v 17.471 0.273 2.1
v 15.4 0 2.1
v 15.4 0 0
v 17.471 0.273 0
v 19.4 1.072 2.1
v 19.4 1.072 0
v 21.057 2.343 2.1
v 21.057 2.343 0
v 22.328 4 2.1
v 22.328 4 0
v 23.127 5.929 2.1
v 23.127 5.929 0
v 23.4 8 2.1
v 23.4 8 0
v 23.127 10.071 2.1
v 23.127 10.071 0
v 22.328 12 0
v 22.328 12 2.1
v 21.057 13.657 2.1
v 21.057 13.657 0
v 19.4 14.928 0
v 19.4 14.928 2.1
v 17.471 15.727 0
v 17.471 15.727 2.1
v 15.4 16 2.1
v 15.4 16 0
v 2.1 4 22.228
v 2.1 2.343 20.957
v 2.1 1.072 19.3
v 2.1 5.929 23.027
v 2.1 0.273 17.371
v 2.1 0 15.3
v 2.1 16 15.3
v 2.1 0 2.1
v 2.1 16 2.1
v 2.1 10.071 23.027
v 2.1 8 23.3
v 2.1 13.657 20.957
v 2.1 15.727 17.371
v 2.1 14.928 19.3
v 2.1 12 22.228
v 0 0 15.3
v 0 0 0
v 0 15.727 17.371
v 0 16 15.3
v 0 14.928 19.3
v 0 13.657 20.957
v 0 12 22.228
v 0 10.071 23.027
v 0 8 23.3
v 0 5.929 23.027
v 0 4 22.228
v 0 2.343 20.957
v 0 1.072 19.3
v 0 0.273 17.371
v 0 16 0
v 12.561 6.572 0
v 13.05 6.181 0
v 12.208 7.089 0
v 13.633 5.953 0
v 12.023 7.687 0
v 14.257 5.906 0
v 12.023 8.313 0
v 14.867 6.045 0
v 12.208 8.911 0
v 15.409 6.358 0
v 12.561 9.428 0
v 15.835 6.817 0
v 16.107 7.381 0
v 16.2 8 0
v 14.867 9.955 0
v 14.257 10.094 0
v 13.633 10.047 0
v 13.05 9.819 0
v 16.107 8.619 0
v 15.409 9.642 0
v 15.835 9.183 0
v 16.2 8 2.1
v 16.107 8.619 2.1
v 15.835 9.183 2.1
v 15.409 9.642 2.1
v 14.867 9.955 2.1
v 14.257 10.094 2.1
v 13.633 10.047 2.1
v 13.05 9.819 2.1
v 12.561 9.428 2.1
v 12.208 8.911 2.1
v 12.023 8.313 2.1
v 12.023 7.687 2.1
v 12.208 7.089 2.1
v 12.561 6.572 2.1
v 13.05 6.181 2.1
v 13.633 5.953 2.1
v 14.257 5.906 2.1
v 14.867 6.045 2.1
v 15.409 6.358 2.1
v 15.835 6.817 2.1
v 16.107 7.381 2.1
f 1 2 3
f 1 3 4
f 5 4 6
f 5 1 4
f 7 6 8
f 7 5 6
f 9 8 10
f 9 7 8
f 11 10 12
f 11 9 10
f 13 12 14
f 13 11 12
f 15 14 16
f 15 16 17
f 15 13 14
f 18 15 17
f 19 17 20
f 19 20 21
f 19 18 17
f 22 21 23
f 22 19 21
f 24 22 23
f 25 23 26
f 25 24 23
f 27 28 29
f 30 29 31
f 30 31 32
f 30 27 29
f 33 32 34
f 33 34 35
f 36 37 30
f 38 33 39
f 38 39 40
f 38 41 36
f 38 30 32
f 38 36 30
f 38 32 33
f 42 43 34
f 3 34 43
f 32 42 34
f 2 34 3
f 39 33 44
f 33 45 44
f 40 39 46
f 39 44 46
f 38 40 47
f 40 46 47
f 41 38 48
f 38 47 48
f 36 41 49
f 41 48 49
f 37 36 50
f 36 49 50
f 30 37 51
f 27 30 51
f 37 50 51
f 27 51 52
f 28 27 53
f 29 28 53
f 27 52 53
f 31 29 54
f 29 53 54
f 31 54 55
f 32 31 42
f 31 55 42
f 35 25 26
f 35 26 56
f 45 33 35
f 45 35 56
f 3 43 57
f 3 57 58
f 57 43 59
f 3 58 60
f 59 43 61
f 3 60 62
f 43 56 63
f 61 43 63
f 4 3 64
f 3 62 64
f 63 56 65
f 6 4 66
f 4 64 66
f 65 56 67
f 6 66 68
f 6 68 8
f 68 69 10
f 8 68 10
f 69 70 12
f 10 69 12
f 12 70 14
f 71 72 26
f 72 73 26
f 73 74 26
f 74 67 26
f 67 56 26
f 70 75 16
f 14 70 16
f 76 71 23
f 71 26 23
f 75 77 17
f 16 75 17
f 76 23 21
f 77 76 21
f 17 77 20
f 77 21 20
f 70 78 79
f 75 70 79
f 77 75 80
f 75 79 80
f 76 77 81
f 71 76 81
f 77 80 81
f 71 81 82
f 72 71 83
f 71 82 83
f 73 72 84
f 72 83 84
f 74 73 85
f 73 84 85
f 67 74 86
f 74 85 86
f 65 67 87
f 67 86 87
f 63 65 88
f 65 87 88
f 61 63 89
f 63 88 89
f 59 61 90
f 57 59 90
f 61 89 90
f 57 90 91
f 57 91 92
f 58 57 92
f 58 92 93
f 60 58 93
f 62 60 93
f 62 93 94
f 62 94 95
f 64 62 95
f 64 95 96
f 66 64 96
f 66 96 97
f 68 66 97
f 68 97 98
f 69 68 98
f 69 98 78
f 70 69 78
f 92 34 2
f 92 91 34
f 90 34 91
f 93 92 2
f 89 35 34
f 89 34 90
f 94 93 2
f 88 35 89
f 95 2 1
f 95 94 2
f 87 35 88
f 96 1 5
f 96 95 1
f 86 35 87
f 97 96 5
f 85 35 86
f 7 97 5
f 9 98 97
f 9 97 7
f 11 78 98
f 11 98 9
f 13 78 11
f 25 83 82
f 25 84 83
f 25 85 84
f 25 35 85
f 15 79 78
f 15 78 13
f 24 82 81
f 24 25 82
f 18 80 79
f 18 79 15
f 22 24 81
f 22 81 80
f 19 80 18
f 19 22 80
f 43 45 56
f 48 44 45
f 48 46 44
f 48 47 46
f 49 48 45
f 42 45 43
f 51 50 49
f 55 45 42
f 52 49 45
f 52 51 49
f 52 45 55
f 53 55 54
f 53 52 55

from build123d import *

# Parameters (mm, degrees)
SKETCH1_W                      = 2.1
SKETCH1_H                      = 8
REVOLVE1_ANGLE                 = 180
SKETCH2_W                      = 2.1
SKETCH2_H                      = 16
BOSS_EXTRUDE1_DEPTH            = 13.2
BOSS_EXTRUDE2_DEPTH            = 2.1
F_4_2_4_2_DIAMETER_HOLE1_D     = 4.2
F_4_2_4_2_DIAMETER_HOLE1_DEPTH = 23.3


with BuildPart() as part:
    # Sketch1 → Revolve1 (revolve)
    with BuildSketch(Plane(origin=(0, 0, 15.3), x_dir=(-1, 0, 0), z_dir=(0, 0, -1))):
        with Locations((-1.05, 12)):
            Rectangle(SKETCH1_W, SKETCH1_H)
    revolve(axis=Axis((2.1, 8, 15.3), (1, 0, 0)), revolution_arc=REVOLVE1_ANGLE)

    # Sketch2 → Boss-Extrude1 (add)
    with BuildSketch(Plane(origin=(0, 0, 15.3), x_dir=(-1, 0, 0), z_dir=(0, 0, -1))):
        with Locations((-1.05, 8)):
            Rectangle(SKETCH2_W, SKETCH2_H)
    extrude(amount=BOSS_EXTRUDE1_DEPTH)

    # Sketch3 → Boss-Extrude2 (add)
    with BuildSketch(Plane(origin=(0, 0, 2.1), x_dir=(-1, 0, 0), z_dir=(0, 0, -1))):
        with BuildLine():
            Line((-15.4, 16), (0, 16))
            Line((0, 16), (0, 0))
            Line((0, 0), (-15.4, 0))
            ThreePointArc((-15.4, 0), (-23.4, 8), (-15.4, 16))
        make_face()
    extrude(amount=BOSS_EXTRUDE2_DEPTH)

    # Ø4.2 (4.2) Diameter Hole1
    with Locations(Plane(origin=(0, 0, 0), x_dir=(-1, 0, 0), z_dir=(0, 0, -1))):
        with Locations((-14.1, 8)):
            Hole(F_4_2_4_2_DIAMETER_HOLE1_D / 2, depth=F_4_2_4_2_DIAMETER_HOLE1_DEPTH)


solid = part.part
